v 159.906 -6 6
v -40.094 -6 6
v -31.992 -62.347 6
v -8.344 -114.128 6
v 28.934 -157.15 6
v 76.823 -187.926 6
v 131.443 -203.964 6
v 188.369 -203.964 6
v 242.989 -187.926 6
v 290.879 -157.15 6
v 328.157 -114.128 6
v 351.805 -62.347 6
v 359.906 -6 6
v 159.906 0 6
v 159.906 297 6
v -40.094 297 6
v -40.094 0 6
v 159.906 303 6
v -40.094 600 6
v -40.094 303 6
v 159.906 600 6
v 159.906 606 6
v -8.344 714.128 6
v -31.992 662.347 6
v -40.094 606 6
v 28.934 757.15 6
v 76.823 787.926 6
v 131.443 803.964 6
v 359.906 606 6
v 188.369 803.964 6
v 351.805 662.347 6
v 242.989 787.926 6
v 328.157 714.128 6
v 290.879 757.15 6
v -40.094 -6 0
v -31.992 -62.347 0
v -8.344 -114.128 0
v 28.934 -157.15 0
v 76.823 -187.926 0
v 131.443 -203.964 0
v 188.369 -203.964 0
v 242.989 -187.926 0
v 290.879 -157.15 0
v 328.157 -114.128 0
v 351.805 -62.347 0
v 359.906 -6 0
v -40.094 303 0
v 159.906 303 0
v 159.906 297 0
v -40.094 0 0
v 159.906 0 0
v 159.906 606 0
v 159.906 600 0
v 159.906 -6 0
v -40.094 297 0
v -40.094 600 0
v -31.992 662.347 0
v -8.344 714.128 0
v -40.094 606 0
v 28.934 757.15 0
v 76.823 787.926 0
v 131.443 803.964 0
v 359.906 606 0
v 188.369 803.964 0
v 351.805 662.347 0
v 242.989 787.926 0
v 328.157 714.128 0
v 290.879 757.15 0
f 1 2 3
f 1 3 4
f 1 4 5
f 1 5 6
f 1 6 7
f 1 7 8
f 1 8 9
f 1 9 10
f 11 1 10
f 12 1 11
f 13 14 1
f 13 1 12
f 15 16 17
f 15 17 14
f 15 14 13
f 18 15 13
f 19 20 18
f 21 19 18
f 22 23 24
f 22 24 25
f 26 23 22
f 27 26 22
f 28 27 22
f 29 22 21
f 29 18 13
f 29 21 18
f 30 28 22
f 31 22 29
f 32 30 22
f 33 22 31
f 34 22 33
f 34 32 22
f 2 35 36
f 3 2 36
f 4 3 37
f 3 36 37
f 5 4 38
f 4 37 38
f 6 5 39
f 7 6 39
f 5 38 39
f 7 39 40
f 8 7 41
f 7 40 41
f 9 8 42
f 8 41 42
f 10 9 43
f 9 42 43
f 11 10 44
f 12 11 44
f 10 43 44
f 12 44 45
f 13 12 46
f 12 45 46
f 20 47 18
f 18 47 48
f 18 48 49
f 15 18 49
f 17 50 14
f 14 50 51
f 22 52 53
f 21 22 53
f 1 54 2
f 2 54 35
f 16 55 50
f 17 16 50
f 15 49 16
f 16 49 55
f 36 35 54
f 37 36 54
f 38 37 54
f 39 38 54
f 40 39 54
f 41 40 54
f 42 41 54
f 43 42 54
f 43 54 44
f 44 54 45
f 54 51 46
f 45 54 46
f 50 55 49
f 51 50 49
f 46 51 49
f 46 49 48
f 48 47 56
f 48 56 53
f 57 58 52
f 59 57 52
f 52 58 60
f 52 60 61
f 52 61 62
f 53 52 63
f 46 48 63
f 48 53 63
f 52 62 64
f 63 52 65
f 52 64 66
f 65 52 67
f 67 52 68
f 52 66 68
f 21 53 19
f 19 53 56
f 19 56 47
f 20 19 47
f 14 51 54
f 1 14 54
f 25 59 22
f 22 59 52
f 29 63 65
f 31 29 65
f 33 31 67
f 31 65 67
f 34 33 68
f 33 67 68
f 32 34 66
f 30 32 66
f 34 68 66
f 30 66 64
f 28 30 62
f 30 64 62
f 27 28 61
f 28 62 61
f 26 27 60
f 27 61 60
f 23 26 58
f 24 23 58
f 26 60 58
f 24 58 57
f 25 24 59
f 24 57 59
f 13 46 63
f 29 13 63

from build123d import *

# Parameters (mm, degrees)
F1_DEPTH = 6


with BuildPart() as f1:
    # F0 (on Top) → F1 (new body)
    with BuildSketch(Plane.XY):
        with BuildLine():
            ThreePointArc((359.906451, 606), (159.906451, 806), (-40.093549, 606))
            Line((-40.093549, 606), (159.906451, 606))
            Line((159.906451, 606), (159.906451, 600))
            Line((159.906451, 600), (-40.093549, 600))
            Line((-40.093549, 600), (-40.093549, 303))
            Line((-40.093549, 303), (159.906451, 303))
            Line((159.906451, 303), (159.906451, 297))
            Line((159.906451, 297), (-40.093549, 297))
            Line((-40.093549, 297), (-40.093549, 0))
            Line((-40.093549, 0), (159.906451, 0))
            Line((159.906451, 0), (159.906451, -6))
            Line((159.906451, -6), (-40.093549, -6))
            ThreePointArc((-40.093549, -6), (159.906451, -206), (359.906451, -6))
            Line((359.906451, -6), (359.906451, 606))
        make_face()
    extrude(amount=F1_DEPTH)


solid = f1.part
